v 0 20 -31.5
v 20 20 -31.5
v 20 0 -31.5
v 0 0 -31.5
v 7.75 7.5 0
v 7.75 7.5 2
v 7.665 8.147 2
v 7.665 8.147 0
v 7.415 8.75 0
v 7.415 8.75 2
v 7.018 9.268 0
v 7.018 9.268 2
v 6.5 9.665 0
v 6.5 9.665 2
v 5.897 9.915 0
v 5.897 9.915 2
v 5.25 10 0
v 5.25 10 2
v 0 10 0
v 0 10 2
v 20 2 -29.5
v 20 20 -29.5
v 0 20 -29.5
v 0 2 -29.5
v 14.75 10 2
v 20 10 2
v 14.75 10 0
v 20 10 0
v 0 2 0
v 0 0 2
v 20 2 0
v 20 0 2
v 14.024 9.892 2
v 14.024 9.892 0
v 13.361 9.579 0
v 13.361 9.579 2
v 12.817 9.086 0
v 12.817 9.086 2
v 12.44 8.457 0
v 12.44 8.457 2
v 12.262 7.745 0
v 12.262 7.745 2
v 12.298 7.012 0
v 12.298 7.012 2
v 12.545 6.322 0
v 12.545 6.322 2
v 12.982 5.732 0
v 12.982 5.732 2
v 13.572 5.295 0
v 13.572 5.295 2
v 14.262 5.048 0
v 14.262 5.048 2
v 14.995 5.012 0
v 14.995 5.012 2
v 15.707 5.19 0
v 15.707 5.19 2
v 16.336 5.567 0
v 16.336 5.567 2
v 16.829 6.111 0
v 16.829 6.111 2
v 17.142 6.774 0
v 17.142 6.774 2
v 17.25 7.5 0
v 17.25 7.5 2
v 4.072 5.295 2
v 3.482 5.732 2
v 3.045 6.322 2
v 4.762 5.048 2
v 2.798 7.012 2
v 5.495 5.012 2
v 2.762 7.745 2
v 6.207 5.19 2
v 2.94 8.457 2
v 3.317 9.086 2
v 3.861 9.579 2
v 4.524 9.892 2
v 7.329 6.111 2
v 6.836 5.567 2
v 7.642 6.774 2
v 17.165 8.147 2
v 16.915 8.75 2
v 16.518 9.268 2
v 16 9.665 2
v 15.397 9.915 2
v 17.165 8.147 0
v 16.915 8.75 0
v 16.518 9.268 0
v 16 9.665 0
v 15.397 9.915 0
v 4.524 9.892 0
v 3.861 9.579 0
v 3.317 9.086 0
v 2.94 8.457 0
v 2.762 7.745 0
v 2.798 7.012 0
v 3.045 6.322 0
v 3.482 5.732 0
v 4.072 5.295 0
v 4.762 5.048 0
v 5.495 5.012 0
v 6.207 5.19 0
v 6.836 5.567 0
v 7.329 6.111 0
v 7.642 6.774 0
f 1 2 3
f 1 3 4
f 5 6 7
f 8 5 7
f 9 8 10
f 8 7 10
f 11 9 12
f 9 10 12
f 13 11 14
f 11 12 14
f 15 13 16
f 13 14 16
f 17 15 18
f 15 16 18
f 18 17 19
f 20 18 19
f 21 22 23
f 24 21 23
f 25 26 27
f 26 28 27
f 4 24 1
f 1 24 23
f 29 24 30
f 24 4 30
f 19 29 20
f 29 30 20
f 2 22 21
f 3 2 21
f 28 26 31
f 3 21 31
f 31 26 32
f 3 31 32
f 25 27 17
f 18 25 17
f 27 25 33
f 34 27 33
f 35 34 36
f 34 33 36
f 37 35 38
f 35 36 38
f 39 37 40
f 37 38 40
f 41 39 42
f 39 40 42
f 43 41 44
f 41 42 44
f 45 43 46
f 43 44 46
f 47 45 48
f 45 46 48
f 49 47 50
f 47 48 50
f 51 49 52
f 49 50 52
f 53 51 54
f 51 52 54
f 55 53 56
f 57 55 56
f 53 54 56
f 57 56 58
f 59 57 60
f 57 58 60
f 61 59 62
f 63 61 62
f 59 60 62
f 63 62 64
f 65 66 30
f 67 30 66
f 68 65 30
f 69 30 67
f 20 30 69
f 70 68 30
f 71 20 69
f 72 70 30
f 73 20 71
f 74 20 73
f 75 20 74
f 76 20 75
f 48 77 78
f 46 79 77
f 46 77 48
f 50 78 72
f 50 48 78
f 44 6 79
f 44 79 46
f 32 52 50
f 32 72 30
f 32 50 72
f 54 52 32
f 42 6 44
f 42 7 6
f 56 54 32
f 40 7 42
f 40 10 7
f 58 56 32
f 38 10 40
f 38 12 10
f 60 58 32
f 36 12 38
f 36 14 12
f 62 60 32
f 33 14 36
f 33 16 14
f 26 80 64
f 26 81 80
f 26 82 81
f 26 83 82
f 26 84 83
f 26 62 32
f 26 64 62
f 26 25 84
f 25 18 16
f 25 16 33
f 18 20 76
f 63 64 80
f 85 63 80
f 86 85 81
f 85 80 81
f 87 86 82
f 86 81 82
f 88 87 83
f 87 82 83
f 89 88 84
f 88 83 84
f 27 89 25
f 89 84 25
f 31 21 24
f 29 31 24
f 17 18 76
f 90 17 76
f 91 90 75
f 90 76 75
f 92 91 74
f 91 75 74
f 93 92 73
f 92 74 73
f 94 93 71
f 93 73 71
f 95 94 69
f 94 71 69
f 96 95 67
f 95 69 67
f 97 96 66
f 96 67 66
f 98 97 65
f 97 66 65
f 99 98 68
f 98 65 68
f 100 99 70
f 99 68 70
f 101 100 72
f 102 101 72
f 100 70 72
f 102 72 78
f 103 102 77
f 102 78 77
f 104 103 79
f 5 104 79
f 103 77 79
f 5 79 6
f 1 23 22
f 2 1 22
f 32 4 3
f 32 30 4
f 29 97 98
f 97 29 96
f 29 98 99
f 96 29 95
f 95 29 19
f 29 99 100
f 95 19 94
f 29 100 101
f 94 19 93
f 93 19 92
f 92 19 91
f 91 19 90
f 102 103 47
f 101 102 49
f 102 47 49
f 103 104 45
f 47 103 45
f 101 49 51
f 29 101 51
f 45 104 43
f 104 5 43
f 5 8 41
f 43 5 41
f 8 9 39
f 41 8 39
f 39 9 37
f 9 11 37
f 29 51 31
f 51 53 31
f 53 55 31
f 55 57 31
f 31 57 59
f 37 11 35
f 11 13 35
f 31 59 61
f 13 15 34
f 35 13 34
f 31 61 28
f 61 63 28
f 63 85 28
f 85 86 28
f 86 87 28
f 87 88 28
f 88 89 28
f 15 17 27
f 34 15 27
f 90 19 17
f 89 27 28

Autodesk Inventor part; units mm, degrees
ref_plane "YZ Plane" through (0, 0, 0) normal (1, 0, 0) x (0, 1, 0)
ref_plane "XZ Plane" through (0, 0, 0) normal (0, 1, 0) x (-1, 0, 0)
ref_plane "XY Plane" through (0, 0, 0) normal (0, 0, 1) x (1, 0, 0)
sketch "Sketch1" plane through (0, 0, 0) normal (0, 1, 0) x (-1, 0, 0)
  line L0 (-20, 0) -> (0, 0)
  line L1 (0, 0) -> (0, -29.5)
  line L2 (0, -29.5) -> (-20, -29.5)
  line L3 (-20, -29.5) -> (-20, 0)
  dimension "d1" = 20
  dimension "d2" = 29.5
sketch "Sketch2" plane through (0, 0, 0) normal (0, 0, 1) x (1, 0, 0)
  point P0 (0, 0)
extrude "Extrusion1" add sketch "Sketch1" along normal blind 2
sketch "Sketch3" plane through (0, 0, 0) normal (0, 0, 1) x (1, 0, 0)
  line L0 (20, 0) -> (0, 0) projected
  line L1 (0, 0) -> (20, 0)
  line L2 (20, 0) -> (20, 10)
  line L3 (20, 10) -> (0, 10)
  line L4 (0, 10) -> (0, 0)
  dimension "d11" = 10
extrude "Extrusion2" add sketch "Sketch3" along normal blind 2
sketch "Sketch4" plane through (0, 0, 2) normal (0, 0, 1) x (1, 0, 0)
  circle A0 centre (5.25, 7.5) radius 2.5
  circle A1 centre (14.75, 7.5) radius 2.5
  line L0 (20, 10) -> (0, 10) projected
  line L1 (0, 10) -> (0, 0) projected
  dimension "d18" = 5
  dimension "d19" = 5
  dimension "d20" = 2.5
  dimension "d21" = 2.5
  dimension "d22" = 9.5
  dimension "d23" = 5.25
extrude "Extrusion3" cut sketch "Sketch4" against normal blind 2 contours A1
sketch "Sketch5" plane through (0, 0, 2) normal (0, 0, 1) x (1, 0, 0)
  circle A0 centre (5.25, 7.5) radius 2.5
  line L0 (14.75, 10) -> (0, 10) projected
  circle A1 centre (14.75, 7.5) radius 2.5 projected
  point P0 (0, 0)
  dimension "d26" = 5
  dimension "d27" = 2.5
  dimension "d28" = 9.5
extrude "Extrusion4" cut sketch "Sketch5" against normal blind 2 contours A0
sketch "Sketch7" plane through (20, 0, -29.5) normal (0, 0, -1) x (-1, 0, 0)
  line L0 (20, 0) -> (0, 0) projected
  line L1 (0, 0) -> (20, 0)
  line L2 (20, 0) -> (20, 20)
  line L3 (20, 20) -> (0, 20)
  line L4 (0, 20) -> (0, 0)
  dimension "d34" = 20
extrude "Extrusion6" add sketch "Sketch7" along normal blind 2
properties part number "Servo Holder Bottom"
